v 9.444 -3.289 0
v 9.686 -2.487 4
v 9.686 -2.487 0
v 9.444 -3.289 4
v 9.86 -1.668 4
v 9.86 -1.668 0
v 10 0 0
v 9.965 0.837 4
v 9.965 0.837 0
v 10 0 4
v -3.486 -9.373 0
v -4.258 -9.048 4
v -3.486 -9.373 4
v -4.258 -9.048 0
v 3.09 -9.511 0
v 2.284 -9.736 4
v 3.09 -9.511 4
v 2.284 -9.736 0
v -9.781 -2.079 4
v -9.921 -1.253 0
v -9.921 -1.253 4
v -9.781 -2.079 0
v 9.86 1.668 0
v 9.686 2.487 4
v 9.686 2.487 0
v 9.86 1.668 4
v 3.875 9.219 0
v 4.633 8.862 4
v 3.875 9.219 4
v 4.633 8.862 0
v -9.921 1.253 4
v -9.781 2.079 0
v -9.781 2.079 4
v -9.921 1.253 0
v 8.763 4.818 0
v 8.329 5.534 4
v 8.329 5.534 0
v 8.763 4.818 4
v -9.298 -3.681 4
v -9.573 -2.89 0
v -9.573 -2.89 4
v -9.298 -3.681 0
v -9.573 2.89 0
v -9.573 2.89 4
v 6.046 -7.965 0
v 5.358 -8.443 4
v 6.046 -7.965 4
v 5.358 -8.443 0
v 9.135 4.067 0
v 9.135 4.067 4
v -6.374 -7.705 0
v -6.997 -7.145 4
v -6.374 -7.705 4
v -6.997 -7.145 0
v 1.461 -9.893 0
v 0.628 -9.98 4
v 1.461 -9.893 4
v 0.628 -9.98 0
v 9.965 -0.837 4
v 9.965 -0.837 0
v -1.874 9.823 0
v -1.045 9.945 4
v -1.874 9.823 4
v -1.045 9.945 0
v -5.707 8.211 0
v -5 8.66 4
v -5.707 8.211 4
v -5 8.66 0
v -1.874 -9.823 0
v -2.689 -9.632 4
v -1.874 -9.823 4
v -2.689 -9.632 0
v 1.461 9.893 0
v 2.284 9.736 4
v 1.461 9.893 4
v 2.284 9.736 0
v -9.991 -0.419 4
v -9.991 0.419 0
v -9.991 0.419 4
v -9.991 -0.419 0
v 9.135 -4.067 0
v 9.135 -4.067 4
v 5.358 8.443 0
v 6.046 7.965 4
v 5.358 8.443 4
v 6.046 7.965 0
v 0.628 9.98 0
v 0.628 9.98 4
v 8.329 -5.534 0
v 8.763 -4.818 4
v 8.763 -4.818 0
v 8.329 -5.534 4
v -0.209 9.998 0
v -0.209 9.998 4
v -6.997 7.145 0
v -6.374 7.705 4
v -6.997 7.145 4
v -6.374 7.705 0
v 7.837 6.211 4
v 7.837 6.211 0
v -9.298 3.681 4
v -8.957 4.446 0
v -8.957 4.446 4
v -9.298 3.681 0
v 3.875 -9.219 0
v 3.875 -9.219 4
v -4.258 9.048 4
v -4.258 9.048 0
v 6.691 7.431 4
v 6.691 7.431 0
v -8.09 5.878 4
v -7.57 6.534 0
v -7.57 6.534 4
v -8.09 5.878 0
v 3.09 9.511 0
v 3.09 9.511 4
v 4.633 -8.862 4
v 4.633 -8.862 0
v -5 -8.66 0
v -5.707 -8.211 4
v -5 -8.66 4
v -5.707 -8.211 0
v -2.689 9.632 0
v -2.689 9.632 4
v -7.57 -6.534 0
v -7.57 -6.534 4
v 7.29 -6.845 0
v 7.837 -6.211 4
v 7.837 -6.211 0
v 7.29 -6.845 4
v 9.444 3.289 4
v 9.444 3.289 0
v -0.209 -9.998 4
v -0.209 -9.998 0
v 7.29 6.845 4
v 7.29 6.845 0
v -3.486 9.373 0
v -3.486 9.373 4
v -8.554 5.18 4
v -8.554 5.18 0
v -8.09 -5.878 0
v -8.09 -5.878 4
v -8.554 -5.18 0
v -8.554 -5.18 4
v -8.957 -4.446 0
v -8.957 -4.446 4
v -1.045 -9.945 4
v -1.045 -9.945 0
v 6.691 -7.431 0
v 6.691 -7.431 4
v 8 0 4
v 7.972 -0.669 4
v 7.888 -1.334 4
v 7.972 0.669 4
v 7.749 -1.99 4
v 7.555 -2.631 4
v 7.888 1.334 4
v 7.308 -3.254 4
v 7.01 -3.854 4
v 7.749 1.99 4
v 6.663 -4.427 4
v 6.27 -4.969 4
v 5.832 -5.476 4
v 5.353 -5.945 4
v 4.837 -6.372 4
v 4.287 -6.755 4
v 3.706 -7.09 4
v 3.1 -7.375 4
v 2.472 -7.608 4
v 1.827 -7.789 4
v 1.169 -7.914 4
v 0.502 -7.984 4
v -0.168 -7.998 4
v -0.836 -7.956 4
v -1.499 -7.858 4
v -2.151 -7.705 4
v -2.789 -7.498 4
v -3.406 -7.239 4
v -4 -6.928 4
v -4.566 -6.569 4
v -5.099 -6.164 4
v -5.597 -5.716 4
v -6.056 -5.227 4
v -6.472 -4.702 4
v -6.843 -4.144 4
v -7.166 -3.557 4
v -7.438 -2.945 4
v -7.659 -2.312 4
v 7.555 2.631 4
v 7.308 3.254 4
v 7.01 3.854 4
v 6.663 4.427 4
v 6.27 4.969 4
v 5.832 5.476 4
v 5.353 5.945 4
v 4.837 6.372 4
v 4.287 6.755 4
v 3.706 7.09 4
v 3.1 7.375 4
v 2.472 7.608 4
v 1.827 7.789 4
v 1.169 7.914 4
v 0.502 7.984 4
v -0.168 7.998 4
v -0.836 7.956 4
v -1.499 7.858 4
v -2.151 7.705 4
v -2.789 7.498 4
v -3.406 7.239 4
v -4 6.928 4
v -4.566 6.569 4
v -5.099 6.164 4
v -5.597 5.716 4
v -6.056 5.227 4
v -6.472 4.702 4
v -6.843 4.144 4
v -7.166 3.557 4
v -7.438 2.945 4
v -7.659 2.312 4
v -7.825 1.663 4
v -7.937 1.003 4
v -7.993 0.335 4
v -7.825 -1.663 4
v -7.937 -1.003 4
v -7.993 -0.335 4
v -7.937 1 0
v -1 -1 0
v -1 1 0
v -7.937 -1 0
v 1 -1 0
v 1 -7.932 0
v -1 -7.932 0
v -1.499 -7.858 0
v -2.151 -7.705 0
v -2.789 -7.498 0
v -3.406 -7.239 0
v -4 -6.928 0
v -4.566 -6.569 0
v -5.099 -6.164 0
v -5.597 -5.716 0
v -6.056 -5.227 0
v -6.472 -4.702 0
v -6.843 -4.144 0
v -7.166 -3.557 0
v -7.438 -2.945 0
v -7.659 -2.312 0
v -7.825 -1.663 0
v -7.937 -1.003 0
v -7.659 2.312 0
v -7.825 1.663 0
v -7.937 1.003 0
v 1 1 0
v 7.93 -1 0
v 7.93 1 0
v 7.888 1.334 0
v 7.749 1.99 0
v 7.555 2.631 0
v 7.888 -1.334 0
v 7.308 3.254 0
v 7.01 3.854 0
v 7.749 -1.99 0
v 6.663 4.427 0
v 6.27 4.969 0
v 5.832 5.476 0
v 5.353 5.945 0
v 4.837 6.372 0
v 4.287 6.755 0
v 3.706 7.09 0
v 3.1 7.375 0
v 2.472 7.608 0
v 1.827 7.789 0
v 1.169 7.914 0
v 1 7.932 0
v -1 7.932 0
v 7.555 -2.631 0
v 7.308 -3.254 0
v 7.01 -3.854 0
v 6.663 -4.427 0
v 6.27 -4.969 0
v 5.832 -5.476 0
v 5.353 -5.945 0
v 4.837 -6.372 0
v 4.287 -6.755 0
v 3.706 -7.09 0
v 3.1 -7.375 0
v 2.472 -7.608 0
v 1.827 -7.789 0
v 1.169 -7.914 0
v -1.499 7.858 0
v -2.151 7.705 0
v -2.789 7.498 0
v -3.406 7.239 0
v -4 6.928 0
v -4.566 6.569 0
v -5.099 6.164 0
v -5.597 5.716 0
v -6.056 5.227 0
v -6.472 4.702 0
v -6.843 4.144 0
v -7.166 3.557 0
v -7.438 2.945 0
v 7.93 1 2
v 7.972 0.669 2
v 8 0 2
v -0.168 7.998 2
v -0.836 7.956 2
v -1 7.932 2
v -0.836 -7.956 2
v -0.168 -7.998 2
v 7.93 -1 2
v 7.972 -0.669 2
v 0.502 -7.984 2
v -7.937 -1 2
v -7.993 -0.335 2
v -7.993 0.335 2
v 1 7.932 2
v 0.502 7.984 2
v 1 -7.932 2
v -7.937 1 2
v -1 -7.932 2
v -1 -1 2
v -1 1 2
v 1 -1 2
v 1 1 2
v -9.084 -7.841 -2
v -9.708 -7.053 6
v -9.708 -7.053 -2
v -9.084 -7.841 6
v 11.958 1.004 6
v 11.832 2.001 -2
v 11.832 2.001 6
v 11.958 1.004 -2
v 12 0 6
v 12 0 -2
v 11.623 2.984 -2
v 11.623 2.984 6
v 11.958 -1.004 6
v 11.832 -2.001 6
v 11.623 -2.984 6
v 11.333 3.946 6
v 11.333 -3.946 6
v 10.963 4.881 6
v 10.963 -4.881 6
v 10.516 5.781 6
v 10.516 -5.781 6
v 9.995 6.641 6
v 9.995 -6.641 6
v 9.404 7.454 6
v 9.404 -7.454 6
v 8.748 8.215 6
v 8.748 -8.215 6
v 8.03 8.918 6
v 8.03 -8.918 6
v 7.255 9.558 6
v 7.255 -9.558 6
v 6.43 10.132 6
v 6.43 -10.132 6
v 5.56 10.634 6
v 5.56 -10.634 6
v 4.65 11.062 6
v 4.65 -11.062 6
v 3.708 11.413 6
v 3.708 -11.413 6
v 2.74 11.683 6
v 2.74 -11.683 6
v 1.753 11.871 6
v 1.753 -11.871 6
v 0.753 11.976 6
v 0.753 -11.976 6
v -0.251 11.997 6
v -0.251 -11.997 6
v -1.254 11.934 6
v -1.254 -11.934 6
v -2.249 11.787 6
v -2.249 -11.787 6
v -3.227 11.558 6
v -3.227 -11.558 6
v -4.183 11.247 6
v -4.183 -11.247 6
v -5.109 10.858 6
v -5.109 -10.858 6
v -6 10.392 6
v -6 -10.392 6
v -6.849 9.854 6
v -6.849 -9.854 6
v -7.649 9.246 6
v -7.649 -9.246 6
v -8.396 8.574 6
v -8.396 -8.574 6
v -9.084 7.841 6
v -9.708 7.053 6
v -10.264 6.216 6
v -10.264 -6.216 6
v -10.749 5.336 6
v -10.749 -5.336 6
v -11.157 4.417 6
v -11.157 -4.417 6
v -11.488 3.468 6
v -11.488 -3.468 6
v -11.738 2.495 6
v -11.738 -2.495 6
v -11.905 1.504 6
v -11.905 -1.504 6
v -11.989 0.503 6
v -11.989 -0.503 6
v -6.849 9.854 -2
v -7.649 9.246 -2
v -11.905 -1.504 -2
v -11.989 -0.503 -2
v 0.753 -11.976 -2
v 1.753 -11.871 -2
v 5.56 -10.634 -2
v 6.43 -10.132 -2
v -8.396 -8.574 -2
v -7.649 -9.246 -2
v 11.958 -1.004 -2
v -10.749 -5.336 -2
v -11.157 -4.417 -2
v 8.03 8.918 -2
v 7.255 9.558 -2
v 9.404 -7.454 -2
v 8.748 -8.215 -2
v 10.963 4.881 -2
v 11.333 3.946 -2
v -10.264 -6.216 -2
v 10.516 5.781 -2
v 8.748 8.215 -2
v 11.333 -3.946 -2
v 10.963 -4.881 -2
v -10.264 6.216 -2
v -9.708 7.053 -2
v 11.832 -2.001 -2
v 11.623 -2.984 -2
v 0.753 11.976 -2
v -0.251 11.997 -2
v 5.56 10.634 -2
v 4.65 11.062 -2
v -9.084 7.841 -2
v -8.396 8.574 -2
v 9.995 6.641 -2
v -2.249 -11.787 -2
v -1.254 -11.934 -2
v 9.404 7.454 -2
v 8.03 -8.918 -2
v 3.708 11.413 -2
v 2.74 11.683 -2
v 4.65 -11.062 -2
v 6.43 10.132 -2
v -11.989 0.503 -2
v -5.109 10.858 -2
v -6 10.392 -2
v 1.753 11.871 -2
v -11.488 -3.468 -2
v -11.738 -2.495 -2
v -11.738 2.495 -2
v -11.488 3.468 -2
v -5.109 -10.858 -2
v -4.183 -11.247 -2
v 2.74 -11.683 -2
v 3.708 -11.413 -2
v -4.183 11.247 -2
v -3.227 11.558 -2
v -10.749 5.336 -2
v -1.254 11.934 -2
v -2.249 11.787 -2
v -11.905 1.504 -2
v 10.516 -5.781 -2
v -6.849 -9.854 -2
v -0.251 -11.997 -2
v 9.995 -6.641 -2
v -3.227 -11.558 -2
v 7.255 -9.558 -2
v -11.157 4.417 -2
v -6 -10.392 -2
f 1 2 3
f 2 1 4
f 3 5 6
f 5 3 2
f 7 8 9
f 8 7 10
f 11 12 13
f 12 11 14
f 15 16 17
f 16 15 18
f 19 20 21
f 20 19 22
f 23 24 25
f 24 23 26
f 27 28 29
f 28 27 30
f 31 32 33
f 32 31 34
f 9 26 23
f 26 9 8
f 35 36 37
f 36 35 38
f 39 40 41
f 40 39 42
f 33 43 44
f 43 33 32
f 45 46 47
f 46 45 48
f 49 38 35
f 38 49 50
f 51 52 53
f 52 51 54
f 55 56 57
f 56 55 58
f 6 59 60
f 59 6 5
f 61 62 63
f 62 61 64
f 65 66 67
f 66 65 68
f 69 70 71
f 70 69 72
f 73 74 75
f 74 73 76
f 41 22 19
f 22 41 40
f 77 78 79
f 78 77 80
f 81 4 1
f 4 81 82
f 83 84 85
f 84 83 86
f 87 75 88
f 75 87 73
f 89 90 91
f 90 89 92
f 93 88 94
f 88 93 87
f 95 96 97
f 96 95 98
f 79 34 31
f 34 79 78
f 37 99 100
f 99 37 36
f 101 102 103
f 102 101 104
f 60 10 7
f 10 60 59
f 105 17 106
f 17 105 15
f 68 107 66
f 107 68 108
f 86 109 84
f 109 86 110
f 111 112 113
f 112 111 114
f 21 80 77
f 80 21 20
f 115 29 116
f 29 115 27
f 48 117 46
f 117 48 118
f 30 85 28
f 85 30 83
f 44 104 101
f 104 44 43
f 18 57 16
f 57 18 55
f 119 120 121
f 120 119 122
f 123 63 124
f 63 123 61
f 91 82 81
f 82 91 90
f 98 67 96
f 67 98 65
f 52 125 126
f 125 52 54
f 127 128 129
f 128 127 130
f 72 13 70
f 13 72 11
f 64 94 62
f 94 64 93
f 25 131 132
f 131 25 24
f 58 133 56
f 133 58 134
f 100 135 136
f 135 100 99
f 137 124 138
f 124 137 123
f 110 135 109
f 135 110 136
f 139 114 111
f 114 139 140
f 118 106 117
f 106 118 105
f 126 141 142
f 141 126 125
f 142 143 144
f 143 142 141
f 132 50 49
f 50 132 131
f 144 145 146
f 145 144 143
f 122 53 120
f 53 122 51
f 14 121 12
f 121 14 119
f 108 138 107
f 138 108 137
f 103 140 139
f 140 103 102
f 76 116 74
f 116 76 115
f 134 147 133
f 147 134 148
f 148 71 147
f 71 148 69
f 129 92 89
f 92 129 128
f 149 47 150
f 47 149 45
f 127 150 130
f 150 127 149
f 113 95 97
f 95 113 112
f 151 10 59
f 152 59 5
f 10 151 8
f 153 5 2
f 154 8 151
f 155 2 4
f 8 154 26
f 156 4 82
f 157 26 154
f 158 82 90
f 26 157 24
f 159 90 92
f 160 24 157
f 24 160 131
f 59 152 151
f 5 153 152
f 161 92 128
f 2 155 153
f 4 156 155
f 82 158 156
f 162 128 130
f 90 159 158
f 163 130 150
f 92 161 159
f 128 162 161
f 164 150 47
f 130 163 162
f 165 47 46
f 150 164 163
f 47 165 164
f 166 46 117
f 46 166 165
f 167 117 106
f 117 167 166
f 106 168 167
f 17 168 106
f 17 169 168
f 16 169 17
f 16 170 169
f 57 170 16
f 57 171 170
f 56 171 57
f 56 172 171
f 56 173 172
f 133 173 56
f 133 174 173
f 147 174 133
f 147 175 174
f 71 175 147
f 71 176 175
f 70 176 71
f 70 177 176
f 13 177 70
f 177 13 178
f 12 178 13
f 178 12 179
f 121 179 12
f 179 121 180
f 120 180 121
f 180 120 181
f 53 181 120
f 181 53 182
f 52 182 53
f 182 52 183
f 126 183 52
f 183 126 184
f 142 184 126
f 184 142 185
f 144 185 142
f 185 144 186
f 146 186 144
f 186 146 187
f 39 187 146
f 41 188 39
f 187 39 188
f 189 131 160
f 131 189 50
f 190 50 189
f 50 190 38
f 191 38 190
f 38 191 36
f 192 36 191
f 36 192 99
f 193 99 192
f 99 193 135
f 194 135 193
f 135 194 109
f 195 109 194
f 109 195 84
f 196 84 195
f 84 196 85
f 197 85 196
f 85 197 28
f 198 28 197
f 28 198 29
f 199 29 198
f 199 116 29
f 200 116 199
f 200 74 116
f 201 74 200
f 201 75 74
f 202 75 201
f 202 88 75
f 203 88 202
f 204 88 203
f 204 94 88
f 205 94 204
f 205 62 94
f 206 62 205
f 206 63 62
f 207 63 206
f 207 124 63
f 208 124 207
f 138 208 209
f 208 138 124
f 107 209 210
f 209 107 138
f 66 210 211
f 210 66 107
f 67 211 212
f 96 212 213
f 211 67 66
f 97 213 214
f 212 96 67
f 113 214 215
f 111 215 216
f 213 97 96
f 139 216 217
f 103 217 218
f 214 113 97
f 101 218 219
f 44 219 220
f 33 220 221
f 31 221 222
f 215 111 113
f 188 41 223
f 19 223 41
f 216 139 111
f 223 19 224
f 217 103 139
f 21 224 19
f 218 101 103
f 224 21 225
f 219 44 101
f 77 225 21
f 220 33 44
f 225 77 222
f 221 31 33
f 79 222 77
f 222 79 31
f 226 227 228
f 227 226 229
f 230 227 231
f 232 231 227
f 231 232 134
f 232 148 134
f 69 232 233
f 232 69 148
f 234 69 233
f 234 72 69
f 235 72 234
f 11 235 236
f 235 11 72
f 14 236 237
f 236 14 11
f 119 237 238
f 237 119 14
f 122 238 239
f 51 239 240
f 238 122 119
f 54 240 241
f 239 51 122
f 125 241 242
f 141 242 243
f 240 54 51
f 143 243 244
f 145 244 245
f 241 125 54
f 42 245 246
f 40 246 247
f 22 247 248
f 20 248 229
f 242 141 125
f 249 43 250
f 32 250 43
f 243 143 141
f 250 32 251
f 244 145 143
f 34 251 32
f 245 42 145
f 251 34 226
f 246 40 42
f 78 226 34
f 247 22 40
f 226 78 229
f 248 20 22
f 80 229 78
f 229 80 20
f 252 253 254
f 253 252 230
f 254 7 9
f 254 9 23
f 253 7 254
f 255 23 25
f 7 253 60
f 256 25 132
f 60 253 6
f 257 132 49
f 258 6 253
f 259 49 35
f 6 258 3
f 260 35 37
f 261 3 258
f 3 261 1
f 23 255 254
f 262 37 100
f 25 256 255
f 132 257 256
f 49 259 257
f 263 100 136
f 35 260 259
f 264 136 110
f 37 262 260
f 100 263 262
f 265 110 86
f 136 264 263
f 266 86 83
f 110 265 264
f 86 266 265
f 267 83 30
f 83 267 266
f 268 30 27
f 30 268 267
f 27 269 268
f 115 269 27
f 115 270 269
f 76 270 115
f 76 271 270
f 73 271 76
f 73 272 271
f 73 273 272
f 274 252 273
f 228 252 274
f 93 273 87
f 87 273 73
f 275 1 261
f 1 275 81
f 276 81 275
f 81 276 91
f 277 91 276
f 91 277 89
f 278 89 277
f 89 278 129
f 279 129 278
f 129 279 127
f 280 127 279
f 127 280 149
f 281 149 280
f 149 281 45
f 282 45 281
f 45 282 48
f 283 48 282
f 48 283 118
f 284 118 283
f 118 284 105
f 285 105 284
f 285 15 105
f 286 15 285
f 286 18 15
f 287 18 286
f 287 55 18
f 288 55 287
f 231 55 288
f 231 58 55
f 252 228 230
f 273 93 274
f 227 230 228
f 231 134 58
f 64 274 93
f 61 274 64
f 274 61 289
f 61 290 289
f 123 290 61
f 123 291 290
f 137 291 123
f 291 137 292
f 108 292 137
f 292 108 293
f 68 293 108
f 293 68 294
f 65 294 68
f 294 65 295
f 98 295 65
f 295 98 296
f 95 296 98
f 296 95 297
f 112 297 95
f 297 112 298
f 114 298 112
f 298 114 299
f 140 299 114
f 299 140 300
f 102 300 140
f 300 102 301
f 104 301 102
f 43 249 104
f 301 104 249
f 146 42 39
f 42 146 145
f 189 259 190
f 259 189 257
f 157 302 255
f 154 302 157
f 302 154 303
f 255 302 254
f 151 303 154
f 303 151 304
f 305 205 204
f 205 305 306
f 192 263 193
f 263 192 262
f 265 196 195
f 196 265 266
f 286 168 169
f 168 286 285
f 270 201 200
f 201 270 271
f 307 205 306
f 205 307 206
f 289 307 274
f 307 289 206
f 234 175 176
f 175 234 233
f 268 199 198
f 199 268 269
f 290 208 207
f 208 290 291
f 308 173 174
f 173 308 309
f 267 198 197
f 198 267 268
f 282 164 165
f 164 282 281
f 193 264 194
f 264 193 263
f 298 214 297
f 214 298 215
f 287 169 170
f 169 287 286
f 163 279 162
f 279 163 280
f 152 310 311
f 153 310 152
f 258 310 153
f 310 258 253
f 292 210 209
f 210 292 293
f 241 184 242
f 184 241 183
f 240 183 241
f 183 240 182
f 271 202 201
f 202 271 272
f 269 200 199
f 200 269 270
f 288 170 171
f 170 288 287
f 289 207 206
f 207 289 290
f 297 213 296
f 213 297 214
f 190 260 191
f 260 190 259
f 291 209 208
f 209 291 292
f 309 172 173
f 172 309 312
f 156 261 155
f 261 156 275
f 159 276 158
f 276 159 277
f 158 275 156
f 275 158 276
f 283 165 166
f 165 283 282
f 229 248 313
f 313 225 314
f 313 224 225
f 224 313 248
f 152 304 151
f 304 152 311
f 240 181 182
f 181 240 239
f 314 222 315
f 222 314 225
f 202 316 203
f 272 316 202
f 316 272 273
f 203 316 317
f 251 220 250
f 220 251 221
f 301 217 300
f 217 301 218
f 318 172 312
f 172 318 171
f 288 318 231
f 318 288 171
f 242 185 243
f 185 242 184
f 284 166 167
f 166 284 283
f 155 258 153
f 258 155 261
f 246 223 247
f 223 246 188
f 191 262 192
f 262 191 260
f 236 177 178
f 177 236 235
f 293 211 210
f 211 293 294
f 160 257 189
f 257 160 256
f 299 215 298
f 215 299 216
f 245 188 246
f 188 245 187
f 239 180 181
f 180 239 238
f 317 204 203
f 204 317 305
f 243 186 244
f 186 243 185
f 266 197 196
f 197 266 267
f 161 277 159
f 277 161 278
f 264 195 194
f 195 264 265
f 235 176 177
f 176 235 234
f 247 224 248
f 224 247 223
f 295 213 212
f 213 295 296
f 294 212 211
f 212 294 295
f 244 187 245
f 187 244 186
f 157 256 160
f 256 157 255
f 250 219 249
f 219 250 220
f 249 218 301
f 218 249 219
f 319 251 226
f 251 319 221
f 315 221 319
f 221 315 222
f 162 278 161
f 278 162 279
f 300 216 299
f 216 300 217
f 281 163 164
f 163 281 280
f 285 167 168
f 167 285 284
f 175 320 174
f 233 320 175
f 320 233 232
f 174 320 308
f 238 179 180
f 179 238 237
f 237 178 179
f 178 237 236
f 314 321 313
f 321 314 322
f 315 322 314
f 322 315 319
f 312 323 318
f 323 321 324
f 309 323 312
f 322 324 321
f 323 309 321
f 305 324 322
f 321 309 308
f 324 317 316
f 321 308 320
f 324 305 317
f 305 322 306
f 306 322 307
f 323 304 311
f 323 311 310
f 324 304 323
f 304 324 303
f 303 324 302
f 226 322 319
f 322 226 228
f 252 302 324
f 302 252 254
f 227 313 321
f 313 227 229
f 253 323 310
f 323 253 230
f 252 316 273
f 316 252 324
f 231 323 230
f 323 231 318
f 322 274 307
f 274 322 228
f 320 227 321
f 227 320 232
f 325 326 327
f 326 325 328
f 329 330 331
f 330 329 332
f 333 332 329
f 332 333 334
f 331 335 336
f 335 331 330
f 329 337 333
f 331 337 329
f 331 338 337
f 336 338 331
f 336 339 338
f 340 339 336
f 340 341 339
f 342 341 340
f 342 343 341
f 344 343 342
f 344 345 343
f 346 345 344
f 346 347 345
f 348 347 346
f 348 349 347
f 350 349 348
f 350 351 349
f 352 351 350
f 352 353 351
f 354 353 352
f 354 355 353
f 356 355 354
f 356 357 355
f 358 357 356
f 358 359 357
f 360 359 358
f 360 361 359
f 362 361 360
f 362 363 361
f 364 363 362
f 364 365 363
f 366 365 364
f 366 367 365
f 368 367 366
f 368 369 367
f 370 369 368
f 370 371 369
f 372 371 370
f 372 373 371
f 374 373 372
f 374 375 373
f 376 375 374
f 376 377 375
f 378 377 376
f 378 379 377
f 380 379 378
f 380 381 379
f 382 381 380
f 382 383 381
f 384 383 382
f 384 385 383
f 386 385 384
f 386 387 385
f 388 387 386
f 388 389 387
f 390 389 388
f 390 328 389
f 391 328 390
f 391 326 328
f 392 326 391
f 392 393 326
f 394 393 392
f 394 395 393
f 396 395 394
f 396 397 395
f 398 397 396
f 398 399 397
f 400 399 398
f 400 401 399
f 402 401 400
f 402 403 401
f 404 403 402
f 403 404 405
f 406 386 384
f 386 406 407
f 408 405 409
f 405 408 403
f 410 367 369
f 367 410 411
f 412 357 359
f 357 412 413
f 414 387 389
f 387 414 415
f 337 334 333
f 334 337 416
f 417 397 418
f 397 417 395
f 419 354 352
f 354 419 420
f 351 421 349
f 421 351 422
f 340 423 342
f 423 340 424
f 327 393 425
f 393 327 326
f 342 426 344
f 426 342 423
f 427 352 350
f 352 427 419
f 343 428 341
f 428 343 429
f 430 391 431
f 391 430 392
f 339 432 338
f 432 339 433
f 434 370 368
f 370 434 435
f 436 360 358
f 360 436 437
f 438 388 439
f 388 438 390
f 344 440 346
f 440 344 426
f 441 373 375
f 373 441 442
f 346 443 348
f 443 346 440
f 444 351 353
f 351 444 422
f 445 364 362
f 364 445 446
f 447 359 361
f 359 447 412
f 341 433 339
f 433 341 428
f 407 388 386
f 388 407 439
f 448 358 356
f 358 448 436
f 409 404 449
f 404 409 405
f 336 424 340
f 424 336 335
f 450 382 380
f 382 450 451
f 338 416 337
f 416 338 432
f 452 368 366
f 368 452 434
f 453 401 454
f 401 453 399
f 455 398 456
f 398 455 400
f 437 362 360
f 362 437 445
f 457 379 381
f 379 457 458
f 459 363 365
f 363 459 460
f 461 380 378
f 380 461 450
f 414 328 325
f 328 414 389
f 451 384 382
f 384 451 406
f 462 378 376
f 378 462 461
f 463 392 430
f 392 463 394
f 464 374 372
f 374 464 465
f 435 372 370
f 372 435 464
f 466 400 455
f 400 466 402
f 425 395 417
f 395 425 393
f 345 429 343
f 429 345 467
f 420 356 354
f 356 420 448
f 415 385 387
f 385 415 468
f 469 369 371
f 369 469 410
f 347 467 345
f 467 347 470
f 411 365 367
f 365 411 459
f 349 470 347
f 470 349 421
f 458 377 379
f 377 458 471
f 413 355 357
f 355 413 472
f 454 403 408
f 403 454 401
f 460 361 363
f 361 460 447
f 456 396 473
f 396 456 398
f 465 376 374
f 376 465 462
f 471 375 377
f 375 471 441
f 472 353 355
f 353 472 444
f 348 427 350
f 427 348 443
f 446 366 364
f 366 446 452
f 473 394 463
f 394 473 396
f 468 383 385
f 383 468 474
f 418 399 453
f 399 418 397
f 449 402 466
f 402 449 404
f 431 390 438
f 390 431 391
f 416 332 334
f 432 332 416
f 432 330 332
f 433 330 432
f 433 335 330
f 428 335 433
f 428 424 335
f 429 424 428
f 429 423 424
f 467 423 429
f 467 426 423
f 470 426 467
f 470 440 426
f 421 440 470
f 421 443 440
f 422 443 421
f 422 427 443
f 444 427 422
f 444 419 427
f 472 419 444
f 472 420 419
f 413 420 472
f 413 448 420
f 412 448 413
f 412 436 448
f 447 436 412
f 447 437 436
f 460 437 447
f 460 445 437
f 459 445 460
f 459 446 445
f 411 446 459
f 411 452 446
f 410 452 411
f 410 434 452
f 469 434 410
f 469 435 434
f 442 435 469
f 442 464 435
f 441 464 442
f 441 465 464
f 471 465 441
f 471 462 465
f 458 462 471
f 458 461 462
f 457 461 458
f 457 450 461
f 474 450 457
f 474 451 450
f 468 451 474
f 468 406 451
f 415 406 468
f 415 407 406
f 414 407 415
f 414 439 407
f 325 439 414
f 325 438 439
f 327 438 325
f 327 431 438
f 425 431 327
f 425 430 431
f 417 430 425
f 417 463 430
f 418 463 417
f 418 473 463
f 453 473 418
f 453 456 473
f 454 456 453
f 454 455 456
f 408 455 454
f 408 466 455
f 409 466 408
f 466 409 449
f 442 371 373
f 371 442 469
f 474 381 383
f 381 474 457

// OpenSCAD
difference(){

	difference(){

		// exterior
		translate([0,0,-2]){
			cylinder(r=12,h=8,$fn=75);
		}

		// interior shape
		union(){
			difference(){
				cylinder(r=10,h=4,$fn=75);
	
				translate([0,0,-1]){
					cylinder(r=8, h=6,$fn=75);
				}
			}

			translate([-9,-1,0]){
				cube([18,2,2]);
			}
	
			translate([-1,-9,0]){
				cube([2,18,2]);
			}
		}
	}
/*
	// cut-away (debug only)
	translate([0,0,-15]){
		cube([30,30,30]);
	}
*/
}
